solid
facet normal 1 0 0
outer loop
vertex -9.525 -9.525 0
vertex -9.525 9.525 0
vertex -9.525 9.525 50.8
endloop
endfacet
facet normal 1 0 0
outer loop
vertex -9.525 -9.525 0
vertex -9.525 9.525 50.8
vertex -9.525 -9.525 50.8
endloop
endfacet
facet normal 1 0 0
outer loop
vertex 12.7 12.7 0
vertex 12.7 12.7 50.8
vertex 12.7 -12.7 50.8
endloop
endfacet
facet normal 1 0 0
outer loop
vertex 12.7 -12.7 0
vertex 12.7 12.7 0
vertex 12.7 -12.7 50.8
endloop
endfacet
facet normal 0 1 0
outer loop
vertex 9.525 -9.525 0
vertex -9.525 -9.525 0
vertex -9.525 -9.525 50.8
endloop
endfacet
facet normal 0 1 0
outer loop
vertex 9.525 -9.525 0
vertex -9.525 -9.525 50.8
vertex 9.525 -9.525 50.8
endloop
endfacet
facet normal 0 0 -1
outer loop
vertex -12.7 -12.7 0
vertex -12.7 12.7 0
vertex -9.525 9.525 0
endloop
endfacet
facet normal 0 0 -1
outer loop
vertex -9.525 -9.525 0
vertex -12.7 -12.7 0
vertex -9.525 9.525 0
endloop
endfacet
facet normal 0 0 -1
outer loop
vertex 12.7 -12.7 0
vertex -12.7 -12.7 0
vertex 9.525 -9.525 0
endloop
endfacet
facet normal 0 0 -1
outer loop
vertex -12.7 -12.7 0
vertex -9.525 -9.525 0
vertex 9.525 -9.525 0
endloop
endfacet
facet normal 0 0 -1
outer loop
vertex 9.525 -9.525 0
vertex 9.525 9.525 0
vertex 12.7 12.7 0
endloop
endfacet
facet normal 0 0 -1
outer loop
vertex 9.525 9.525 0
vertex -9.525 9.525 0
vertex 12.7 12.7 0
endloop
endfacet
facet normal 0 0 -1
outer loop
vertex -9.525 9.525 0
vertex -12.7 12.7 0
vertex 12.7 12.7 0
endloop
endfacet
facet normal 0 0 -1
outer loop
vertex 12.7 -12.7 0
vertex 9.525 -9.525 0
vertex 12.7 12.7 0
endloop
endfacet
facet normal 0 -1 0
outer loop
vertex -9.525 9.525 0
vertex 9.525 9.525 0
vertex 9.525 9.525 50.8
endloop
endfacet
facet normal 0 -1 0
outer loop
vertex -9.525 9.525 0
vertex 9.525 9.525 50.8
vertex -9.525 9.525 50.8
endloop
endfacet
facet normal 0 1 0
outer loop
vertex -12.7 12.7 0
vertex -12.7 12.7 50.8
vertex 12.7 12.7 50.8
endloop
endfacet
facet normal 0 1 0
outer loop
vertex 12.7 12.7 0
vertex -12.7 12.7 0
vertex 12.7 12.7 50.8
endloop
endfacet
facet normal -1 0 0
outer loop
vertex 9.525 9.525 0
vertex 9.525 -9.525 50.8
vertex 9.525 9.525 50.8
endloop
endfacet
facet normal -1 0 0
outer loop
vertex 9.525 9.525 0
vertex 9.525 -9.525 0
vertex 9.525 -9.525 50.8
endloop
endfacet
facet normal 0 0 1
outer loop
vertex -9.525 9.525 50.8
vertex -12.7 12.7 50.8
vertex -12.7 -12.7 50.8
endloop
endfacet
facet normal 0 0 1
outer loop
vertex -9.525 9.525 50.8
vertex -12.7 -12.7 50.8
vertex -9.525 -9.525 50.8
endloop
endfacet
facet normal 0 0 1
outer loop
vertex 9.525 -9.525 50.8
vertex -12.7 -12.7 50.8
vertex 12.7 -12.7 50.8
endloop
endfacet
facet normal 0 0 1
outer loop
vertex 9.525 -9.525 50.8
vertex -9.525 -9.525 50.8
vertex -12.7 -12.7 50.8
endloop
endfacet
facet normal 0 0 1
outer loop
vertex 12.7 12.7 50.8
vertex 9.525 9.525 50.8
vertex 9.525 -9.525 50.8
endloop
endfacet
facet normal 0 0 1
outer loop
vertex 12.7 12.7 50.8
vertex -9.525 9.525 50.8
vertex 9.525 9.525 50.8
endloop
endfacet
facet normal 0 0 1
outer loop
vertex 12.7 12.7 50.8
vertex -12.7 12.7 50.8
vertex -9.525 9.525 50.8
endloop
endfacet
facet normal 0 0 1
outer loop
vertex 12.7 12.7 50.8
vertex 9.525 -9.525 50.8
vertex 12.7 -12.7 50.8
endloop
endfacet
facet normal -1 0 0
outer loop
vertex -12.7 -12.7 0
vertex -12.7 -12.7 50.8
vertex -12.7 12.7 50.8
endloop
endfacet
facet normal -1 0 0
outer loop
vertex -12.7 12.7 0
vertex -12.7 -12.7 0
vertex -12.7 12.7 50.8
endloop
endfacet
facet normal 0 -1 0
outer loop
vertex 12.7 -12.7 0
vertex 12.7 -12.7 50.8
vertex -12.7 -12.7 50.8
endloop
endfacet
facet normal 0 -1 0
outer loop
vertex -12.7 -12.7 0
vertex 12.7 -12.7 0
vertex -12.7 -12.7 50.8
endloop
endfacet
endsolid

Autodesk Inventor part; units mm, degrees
ref_plane "YZ Plane" through (0, 0, 0) normal (1, 0, 0) x (0, 1, 0)
ref_plane "Start Plane" through (0, 0, 0) normal (0, 0, 1) x (1, 0, 0)
ref_plane "End Plane" through (0, 0, 50.8) normal (0, 0, 1) x (1, 0, 0)
sketch "Sketch1" plane through (0, 0, 0) normal (0, 0, 1) x (1, 0, 0)
  line L0 (-12.7, 12.7) -> (12.7, 12.7)
  line L1 (12.7, 12.7) -> (12.7, -12.7)
  line L2 (12.7, -12.7) -> (-12.7, -12.7)
  line L3 (-12.7, -12.7) -> (-12.7, 12.7)
  line L4 (9.525, 9.525) -> (-9.525, 9.525)
  line L5 (-9.525, 9.525) -> (-9.525, -9.525)
  line L6 (-9.525, -9.525) -> (9.525, -9.525)
  line L7 (9.525, -9.525) -> (9.525, 9.525)
  point P0 (0, 0)
  point P1 (0, 12.7)
  point P2 (-12.7, 0)
  dimension "width" = 25.4
  dimension "d1" = 3.175
extrude "Body" add sketch "Sketch1" along normal up to surface (50.8 mm away) from surface at 0
sketch "Sketch4" plane through (0, 0, 0) normal (0, 0, 1) x (1, 0, 0)
  line L0 (0, 0) -> (10, 0)
ref_plane "Work Plane4" through (0, 0, 0) normal (0, -1, 0) x (1, 0, 0)
sketch "Sketch5" plane through (0, 0, 0) normal (0, -1, 0) x (1, 0, 0)
  line L0 (-17.78, 0) -> (17.78, 0)
  line L1 (-17.78, 50.8) -> (17.78, 50.8)
  dimension "d9" = 50.8
equation "\"G_OFFSET_START\" = 0"
equation "\"G_OFFSET_END\" = 0"
equation "\"d5\" = length + G_OFFSET_END"
equation "\"G_L\" = d9"
equation "\"length\" = 50.8"
properties part number "Square Tube Profile"
